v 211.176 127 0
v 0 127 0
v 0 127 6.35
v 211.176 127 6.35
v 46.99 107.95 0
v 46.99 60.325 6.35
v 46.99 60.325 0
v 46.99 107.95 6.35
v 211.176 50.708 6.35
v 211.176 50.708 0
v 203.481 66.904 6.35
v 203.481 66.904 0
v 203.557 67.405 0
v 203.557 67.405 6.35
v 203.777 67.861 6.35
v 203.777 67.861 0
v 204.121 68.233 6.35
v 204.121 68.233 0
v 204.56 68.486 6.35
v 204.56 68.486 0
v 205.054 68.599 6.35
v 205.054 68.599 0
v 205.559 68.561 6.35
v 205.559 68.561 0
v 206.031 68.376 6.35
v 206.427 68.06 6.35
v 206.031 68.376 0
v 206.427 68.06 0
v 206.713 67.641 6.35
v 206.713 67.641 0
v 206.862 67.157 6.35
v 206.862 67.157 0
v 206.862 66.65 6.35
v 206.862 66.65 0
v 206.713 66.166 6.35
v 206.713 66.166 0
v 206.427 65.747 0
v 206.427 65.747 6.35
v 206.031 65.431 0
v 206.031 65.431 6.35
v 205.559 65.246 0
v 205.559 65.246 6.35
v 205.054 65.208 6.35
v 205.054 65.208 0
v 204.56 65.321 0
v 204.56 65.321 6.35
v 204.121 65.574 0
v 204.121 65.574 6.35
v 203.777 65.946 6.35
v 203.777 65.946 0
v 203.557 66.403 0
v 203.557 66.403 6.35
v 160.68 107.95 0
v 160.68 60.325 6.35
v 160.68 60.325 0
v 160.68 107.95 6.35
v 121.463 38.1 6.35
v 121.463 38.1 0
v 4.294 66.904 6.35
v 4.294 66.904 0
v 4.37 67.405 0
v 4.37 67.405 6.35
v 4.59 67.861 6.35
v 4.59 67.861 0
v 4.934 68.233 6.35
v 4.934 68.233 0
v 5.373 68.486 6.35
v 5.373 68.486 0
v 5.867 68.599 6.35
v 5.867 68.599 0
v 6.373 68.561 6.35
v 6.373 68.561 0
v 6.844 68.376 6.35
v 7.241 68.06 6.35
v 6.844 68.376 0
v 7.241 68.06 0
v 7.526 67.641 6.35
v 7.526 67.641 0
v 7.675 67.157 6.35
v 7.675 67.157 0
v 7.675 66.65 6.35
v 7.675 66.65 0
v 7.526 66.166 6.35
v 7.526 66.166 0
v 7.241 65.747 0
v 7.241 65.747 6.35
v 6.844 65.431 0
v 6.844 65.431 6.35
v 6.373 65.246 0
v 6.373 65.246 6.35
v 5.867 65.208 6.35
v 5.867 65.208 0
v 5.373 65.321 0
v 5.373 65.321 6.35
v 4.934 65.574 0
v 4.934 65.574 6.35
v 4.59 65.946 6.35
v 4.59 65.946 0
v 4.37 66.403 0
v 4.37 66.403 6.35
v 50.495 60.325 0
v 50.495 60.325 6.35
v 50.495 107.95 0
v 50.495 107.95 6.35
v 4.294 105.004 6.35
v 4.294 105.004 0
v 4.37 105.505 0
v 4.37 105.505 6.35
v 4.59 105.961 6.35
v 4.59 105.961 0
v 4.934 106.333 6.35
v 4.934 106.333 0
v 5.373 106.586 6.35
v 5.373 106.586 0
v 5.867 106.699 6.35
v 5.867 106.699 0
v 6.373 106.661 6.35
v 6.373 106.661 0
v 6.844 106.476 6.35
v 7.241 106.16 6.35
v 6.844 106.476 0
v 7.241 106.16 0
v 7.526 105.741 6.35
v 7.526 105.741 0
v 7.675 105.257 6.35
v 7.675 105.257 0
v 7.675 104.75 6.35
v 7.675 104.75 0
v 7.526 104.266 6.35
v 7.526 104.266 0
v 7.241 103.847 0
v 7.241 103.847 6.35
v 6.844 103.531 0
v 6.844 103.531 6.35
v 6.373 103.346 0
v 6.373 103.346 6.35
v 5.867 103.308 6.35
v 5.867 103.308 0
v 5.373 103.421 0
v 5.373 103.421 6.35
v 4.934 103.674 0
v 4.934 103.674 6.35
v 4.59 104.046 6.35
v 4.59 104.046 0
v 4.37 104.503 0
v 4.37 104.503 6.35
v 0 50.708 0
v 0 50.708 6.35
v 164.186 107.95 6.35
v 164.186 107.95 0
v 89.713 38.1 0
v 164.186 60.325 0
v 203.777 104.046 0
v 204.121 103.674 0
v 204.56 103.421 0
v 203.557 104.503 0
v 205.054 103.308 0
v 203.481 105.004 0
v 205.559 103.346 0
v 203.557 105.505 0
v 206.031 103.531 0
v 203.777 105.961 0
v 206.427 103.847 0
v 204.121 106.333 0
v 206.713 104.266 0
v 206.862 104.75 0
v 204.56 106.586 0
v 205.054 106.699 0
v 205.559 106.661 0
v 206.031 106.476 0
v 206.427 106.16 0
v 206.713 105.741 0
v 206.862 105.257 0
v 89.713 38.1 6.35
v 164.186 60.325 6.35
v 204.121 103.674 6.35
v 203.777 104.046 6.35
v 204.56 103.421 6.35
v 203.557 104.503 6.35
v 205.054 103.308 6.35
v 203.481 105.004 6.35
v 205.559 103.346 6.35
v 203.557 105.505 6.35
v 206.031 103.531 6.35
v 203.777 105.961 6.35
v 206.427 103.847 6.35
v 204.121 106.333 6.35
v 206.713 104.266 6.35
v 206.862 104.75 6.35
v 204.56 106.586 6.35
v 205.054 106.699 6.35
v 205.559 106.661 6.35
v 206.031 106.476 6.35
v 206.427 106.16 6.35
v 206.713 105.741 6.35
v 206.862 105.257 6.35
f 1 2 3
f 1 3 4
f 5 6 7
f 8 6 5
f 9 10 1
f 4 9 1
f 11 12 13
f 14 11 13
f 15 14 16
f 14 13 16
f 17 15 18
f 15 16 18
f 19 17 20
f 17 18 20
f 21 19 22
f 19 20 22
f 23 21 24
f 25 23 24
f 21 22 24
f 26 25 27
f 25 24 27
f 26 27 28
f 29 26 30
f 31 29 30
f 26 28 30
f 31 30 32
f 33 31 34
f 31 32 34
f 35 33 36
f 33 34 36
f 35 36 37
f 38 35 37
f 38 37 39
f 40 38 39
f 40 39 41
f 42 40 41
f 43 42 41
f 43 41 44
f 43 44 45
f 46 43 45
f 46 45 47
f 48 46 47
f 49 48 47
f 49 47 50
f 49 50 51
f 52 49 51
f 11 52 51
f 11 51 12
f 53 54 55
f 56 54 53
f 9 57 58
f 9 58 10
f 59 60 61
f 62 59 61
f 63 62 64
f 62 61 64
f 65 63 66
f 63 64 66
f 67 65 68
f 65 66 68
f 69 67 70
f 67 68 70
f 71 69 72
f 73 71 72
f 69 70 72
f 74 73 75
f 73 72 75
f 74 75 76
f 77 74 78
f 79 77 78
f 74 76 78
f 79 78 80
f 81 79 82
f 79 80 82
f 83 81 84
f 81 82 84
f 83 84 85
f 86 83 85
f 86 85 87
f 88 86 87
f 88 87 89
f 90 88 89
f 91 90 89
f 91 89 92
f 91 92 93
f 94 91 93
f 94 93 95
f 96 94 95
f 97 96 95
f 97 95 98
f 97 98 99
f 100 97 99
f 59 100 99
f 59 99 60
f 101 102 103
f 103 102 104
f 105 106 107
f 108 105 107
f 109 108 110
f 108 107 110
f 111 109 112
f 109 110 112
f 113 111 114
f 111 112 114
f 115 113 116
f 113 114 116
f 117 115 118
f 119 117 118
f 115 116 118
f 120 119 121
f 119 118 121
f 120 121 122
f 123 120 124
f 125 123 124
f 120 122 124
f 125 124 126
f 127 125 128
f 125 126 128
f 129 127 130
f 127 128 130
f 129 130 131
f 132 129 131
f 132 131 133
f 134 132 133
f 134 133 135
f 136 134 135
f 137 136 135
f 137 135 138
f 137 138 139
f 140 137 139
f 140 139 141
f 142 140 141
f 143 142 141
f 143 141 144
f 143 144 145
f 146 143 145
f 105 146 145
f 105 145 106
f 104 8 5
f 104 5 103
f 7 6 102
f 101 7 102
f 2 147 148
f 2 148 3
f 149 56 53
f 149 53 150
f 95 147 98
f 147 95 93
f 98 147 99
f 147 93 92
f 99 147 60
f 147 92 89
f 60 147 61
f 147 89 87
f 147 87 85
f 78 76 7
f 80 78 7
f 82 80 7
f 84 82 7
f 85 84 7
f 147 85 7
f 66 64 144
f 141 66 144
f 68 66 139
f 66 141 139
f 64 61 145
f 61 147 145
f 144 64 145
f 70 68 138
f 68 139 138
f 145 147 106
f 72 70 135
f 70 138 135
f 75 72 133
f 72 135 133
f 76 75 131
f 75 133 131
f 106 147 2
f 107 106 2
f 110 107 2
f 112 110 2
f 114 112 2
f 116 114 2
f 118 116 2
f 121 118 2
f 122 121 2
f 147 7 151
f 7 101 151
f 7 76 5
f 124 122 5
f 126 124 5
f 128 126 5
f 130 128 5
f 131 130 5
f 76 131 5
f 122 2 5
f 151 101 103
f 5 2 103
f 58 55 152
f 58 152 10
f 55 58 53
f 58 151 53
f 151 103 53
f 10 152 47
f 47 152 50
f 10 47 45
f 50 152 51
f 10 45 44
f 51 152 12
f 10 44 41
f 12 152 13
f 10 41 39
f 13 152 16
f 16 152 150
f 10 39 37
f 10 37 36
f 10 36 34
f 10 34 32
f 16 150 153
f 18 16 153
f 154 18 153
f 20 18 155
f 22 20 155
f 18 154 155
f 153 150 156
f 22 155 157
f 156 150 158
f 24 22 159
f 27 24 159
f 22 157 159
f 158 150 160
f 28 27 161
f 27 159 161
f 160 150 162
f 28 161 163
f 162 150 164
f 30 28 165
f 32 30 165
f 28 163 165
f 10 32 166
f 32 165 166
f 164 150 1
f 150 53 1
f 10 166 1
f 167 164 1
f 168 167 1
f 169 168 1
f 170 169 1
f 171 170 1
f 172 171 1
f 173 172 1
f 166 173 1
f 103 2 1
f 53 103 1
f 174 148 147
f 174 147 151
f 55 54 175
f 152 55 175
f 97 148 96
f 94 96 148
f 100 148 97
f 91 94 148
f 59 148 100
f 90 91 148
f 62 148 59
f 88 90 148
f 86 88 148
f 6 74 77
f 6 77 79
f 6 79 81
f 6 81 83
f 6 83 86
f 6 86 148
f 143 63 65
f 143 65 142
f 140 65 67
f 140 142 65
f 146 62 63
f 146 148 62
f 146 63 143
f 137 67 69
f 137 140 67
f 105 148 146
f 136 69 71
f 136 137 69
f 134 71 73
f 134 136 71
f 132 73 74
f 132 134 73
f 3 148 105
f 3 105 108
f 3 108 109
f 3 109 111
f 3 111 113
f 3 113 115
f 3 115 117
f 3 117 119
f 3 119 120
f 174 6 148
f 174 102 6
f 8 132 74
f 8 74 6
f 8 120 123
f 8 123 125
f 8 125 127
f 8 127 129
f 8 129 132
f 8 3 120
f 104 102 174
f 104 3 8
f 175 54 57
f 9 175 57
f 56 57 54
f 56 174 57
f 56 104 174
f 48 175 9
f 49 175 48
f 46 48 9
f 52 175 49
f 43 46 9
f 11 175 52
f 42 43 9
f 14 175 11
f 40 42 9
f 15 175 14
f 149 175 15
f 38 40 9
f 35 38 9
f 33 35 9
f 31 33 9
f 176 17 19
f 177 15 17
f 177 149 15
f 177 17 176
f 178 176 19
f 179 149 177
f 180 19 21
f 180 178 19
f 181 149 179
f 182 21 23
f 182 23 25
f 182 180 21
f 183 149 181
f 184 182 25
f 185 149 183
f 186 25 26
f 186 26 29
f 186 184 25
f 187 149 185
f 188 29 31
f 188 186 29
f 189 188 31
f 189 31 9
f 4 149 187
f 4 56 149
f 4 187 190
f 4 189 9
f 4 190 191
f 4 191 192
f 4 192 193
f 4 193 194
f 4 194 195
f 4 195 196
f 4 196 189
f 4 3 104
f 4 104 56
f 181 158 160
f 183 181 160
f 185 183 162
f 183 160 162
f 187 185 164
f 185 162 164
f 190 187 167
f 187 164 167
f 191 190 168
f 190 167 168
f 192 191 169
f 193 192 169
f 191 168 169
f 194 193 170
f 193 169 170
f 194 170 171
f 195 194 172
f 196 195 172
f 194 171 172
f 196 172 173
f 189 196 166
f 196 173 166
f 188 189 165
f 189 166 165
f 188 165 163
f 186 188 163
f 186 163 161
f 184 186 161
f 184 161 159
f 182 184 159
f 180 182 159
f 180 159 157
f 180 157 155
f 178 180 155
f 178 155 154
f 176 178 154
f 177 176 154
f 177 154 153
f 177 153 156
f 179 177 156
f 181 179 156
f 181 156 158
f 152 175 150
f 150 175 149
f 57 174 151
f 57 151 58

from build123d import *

# Parameters (mm, degrees)
SKETCH1_W            = 211.1756
SKETCH1_H            = 127
BOSS_EXTRUDE1_DEPTH  = 6.35
M3_CLEARANCE_HOLE1_D = 3.4
SKETCH4_W            = 3.5052
SKETCH4_H            = 47.625
CUT_EXTRUDE1_DEPTH   = 247.50447569
CUT_EXTRUDE2_DEPTH   = 247.50447569


with BuildPart() as part:
    # Sketch1 → Boss-Extrude1 (new body)
    with BuildSketch(Plane.XY):
        with Locations((105.5878, 63.5)):
            Rectangle(SKETCH1_W, SKETCH1_H)
    extrude(amount=BOSS_EXTRUDE1_DEPTH)

    # M3 Clearance Hole1 (through all)
    with Locations(Plane.XY.offset(6.35)):
        with Locations((5.9944, 105.0036), (5.9944, 66.9036), (205.1812, 66.9036), (205.1812, 105.0036)):
            Hole(M3_CLEARANCE_HOLE1_D / 2)

    # Sketch4 → Cut-Extrude1 (cut, through all)
    with BuildSketch(Plane.XY.offset(6.35)):
        with Locations((48.7426, 84.1375)):
            Rectangle(SKETCH4_W, SKETCH4_H)
        with Locations((162.433, 84.1375)):
            Rectangle(SKETCH4_W, SKETCH4_H)
    extrude(amount=-CUT_EXTRUDE1_DEPTH, mode=Mode.SUBTRACT)

    # Sketch5 → Cut-Extrude2 (cut, through all)
    with BuildSketch(Plane.XY.offset(6.35)):
        Polygon((0, 50.708311795), (89.7128, 38.1), (121.4628, 38.1), (211.1756, 50.708311795), (211.1756, 0), (0, 0), align=None)
    extrude(amount=-CUT_EXTRUDE2_DEPTH, mode=Mode.SUBTRACT)


solid = part.part
